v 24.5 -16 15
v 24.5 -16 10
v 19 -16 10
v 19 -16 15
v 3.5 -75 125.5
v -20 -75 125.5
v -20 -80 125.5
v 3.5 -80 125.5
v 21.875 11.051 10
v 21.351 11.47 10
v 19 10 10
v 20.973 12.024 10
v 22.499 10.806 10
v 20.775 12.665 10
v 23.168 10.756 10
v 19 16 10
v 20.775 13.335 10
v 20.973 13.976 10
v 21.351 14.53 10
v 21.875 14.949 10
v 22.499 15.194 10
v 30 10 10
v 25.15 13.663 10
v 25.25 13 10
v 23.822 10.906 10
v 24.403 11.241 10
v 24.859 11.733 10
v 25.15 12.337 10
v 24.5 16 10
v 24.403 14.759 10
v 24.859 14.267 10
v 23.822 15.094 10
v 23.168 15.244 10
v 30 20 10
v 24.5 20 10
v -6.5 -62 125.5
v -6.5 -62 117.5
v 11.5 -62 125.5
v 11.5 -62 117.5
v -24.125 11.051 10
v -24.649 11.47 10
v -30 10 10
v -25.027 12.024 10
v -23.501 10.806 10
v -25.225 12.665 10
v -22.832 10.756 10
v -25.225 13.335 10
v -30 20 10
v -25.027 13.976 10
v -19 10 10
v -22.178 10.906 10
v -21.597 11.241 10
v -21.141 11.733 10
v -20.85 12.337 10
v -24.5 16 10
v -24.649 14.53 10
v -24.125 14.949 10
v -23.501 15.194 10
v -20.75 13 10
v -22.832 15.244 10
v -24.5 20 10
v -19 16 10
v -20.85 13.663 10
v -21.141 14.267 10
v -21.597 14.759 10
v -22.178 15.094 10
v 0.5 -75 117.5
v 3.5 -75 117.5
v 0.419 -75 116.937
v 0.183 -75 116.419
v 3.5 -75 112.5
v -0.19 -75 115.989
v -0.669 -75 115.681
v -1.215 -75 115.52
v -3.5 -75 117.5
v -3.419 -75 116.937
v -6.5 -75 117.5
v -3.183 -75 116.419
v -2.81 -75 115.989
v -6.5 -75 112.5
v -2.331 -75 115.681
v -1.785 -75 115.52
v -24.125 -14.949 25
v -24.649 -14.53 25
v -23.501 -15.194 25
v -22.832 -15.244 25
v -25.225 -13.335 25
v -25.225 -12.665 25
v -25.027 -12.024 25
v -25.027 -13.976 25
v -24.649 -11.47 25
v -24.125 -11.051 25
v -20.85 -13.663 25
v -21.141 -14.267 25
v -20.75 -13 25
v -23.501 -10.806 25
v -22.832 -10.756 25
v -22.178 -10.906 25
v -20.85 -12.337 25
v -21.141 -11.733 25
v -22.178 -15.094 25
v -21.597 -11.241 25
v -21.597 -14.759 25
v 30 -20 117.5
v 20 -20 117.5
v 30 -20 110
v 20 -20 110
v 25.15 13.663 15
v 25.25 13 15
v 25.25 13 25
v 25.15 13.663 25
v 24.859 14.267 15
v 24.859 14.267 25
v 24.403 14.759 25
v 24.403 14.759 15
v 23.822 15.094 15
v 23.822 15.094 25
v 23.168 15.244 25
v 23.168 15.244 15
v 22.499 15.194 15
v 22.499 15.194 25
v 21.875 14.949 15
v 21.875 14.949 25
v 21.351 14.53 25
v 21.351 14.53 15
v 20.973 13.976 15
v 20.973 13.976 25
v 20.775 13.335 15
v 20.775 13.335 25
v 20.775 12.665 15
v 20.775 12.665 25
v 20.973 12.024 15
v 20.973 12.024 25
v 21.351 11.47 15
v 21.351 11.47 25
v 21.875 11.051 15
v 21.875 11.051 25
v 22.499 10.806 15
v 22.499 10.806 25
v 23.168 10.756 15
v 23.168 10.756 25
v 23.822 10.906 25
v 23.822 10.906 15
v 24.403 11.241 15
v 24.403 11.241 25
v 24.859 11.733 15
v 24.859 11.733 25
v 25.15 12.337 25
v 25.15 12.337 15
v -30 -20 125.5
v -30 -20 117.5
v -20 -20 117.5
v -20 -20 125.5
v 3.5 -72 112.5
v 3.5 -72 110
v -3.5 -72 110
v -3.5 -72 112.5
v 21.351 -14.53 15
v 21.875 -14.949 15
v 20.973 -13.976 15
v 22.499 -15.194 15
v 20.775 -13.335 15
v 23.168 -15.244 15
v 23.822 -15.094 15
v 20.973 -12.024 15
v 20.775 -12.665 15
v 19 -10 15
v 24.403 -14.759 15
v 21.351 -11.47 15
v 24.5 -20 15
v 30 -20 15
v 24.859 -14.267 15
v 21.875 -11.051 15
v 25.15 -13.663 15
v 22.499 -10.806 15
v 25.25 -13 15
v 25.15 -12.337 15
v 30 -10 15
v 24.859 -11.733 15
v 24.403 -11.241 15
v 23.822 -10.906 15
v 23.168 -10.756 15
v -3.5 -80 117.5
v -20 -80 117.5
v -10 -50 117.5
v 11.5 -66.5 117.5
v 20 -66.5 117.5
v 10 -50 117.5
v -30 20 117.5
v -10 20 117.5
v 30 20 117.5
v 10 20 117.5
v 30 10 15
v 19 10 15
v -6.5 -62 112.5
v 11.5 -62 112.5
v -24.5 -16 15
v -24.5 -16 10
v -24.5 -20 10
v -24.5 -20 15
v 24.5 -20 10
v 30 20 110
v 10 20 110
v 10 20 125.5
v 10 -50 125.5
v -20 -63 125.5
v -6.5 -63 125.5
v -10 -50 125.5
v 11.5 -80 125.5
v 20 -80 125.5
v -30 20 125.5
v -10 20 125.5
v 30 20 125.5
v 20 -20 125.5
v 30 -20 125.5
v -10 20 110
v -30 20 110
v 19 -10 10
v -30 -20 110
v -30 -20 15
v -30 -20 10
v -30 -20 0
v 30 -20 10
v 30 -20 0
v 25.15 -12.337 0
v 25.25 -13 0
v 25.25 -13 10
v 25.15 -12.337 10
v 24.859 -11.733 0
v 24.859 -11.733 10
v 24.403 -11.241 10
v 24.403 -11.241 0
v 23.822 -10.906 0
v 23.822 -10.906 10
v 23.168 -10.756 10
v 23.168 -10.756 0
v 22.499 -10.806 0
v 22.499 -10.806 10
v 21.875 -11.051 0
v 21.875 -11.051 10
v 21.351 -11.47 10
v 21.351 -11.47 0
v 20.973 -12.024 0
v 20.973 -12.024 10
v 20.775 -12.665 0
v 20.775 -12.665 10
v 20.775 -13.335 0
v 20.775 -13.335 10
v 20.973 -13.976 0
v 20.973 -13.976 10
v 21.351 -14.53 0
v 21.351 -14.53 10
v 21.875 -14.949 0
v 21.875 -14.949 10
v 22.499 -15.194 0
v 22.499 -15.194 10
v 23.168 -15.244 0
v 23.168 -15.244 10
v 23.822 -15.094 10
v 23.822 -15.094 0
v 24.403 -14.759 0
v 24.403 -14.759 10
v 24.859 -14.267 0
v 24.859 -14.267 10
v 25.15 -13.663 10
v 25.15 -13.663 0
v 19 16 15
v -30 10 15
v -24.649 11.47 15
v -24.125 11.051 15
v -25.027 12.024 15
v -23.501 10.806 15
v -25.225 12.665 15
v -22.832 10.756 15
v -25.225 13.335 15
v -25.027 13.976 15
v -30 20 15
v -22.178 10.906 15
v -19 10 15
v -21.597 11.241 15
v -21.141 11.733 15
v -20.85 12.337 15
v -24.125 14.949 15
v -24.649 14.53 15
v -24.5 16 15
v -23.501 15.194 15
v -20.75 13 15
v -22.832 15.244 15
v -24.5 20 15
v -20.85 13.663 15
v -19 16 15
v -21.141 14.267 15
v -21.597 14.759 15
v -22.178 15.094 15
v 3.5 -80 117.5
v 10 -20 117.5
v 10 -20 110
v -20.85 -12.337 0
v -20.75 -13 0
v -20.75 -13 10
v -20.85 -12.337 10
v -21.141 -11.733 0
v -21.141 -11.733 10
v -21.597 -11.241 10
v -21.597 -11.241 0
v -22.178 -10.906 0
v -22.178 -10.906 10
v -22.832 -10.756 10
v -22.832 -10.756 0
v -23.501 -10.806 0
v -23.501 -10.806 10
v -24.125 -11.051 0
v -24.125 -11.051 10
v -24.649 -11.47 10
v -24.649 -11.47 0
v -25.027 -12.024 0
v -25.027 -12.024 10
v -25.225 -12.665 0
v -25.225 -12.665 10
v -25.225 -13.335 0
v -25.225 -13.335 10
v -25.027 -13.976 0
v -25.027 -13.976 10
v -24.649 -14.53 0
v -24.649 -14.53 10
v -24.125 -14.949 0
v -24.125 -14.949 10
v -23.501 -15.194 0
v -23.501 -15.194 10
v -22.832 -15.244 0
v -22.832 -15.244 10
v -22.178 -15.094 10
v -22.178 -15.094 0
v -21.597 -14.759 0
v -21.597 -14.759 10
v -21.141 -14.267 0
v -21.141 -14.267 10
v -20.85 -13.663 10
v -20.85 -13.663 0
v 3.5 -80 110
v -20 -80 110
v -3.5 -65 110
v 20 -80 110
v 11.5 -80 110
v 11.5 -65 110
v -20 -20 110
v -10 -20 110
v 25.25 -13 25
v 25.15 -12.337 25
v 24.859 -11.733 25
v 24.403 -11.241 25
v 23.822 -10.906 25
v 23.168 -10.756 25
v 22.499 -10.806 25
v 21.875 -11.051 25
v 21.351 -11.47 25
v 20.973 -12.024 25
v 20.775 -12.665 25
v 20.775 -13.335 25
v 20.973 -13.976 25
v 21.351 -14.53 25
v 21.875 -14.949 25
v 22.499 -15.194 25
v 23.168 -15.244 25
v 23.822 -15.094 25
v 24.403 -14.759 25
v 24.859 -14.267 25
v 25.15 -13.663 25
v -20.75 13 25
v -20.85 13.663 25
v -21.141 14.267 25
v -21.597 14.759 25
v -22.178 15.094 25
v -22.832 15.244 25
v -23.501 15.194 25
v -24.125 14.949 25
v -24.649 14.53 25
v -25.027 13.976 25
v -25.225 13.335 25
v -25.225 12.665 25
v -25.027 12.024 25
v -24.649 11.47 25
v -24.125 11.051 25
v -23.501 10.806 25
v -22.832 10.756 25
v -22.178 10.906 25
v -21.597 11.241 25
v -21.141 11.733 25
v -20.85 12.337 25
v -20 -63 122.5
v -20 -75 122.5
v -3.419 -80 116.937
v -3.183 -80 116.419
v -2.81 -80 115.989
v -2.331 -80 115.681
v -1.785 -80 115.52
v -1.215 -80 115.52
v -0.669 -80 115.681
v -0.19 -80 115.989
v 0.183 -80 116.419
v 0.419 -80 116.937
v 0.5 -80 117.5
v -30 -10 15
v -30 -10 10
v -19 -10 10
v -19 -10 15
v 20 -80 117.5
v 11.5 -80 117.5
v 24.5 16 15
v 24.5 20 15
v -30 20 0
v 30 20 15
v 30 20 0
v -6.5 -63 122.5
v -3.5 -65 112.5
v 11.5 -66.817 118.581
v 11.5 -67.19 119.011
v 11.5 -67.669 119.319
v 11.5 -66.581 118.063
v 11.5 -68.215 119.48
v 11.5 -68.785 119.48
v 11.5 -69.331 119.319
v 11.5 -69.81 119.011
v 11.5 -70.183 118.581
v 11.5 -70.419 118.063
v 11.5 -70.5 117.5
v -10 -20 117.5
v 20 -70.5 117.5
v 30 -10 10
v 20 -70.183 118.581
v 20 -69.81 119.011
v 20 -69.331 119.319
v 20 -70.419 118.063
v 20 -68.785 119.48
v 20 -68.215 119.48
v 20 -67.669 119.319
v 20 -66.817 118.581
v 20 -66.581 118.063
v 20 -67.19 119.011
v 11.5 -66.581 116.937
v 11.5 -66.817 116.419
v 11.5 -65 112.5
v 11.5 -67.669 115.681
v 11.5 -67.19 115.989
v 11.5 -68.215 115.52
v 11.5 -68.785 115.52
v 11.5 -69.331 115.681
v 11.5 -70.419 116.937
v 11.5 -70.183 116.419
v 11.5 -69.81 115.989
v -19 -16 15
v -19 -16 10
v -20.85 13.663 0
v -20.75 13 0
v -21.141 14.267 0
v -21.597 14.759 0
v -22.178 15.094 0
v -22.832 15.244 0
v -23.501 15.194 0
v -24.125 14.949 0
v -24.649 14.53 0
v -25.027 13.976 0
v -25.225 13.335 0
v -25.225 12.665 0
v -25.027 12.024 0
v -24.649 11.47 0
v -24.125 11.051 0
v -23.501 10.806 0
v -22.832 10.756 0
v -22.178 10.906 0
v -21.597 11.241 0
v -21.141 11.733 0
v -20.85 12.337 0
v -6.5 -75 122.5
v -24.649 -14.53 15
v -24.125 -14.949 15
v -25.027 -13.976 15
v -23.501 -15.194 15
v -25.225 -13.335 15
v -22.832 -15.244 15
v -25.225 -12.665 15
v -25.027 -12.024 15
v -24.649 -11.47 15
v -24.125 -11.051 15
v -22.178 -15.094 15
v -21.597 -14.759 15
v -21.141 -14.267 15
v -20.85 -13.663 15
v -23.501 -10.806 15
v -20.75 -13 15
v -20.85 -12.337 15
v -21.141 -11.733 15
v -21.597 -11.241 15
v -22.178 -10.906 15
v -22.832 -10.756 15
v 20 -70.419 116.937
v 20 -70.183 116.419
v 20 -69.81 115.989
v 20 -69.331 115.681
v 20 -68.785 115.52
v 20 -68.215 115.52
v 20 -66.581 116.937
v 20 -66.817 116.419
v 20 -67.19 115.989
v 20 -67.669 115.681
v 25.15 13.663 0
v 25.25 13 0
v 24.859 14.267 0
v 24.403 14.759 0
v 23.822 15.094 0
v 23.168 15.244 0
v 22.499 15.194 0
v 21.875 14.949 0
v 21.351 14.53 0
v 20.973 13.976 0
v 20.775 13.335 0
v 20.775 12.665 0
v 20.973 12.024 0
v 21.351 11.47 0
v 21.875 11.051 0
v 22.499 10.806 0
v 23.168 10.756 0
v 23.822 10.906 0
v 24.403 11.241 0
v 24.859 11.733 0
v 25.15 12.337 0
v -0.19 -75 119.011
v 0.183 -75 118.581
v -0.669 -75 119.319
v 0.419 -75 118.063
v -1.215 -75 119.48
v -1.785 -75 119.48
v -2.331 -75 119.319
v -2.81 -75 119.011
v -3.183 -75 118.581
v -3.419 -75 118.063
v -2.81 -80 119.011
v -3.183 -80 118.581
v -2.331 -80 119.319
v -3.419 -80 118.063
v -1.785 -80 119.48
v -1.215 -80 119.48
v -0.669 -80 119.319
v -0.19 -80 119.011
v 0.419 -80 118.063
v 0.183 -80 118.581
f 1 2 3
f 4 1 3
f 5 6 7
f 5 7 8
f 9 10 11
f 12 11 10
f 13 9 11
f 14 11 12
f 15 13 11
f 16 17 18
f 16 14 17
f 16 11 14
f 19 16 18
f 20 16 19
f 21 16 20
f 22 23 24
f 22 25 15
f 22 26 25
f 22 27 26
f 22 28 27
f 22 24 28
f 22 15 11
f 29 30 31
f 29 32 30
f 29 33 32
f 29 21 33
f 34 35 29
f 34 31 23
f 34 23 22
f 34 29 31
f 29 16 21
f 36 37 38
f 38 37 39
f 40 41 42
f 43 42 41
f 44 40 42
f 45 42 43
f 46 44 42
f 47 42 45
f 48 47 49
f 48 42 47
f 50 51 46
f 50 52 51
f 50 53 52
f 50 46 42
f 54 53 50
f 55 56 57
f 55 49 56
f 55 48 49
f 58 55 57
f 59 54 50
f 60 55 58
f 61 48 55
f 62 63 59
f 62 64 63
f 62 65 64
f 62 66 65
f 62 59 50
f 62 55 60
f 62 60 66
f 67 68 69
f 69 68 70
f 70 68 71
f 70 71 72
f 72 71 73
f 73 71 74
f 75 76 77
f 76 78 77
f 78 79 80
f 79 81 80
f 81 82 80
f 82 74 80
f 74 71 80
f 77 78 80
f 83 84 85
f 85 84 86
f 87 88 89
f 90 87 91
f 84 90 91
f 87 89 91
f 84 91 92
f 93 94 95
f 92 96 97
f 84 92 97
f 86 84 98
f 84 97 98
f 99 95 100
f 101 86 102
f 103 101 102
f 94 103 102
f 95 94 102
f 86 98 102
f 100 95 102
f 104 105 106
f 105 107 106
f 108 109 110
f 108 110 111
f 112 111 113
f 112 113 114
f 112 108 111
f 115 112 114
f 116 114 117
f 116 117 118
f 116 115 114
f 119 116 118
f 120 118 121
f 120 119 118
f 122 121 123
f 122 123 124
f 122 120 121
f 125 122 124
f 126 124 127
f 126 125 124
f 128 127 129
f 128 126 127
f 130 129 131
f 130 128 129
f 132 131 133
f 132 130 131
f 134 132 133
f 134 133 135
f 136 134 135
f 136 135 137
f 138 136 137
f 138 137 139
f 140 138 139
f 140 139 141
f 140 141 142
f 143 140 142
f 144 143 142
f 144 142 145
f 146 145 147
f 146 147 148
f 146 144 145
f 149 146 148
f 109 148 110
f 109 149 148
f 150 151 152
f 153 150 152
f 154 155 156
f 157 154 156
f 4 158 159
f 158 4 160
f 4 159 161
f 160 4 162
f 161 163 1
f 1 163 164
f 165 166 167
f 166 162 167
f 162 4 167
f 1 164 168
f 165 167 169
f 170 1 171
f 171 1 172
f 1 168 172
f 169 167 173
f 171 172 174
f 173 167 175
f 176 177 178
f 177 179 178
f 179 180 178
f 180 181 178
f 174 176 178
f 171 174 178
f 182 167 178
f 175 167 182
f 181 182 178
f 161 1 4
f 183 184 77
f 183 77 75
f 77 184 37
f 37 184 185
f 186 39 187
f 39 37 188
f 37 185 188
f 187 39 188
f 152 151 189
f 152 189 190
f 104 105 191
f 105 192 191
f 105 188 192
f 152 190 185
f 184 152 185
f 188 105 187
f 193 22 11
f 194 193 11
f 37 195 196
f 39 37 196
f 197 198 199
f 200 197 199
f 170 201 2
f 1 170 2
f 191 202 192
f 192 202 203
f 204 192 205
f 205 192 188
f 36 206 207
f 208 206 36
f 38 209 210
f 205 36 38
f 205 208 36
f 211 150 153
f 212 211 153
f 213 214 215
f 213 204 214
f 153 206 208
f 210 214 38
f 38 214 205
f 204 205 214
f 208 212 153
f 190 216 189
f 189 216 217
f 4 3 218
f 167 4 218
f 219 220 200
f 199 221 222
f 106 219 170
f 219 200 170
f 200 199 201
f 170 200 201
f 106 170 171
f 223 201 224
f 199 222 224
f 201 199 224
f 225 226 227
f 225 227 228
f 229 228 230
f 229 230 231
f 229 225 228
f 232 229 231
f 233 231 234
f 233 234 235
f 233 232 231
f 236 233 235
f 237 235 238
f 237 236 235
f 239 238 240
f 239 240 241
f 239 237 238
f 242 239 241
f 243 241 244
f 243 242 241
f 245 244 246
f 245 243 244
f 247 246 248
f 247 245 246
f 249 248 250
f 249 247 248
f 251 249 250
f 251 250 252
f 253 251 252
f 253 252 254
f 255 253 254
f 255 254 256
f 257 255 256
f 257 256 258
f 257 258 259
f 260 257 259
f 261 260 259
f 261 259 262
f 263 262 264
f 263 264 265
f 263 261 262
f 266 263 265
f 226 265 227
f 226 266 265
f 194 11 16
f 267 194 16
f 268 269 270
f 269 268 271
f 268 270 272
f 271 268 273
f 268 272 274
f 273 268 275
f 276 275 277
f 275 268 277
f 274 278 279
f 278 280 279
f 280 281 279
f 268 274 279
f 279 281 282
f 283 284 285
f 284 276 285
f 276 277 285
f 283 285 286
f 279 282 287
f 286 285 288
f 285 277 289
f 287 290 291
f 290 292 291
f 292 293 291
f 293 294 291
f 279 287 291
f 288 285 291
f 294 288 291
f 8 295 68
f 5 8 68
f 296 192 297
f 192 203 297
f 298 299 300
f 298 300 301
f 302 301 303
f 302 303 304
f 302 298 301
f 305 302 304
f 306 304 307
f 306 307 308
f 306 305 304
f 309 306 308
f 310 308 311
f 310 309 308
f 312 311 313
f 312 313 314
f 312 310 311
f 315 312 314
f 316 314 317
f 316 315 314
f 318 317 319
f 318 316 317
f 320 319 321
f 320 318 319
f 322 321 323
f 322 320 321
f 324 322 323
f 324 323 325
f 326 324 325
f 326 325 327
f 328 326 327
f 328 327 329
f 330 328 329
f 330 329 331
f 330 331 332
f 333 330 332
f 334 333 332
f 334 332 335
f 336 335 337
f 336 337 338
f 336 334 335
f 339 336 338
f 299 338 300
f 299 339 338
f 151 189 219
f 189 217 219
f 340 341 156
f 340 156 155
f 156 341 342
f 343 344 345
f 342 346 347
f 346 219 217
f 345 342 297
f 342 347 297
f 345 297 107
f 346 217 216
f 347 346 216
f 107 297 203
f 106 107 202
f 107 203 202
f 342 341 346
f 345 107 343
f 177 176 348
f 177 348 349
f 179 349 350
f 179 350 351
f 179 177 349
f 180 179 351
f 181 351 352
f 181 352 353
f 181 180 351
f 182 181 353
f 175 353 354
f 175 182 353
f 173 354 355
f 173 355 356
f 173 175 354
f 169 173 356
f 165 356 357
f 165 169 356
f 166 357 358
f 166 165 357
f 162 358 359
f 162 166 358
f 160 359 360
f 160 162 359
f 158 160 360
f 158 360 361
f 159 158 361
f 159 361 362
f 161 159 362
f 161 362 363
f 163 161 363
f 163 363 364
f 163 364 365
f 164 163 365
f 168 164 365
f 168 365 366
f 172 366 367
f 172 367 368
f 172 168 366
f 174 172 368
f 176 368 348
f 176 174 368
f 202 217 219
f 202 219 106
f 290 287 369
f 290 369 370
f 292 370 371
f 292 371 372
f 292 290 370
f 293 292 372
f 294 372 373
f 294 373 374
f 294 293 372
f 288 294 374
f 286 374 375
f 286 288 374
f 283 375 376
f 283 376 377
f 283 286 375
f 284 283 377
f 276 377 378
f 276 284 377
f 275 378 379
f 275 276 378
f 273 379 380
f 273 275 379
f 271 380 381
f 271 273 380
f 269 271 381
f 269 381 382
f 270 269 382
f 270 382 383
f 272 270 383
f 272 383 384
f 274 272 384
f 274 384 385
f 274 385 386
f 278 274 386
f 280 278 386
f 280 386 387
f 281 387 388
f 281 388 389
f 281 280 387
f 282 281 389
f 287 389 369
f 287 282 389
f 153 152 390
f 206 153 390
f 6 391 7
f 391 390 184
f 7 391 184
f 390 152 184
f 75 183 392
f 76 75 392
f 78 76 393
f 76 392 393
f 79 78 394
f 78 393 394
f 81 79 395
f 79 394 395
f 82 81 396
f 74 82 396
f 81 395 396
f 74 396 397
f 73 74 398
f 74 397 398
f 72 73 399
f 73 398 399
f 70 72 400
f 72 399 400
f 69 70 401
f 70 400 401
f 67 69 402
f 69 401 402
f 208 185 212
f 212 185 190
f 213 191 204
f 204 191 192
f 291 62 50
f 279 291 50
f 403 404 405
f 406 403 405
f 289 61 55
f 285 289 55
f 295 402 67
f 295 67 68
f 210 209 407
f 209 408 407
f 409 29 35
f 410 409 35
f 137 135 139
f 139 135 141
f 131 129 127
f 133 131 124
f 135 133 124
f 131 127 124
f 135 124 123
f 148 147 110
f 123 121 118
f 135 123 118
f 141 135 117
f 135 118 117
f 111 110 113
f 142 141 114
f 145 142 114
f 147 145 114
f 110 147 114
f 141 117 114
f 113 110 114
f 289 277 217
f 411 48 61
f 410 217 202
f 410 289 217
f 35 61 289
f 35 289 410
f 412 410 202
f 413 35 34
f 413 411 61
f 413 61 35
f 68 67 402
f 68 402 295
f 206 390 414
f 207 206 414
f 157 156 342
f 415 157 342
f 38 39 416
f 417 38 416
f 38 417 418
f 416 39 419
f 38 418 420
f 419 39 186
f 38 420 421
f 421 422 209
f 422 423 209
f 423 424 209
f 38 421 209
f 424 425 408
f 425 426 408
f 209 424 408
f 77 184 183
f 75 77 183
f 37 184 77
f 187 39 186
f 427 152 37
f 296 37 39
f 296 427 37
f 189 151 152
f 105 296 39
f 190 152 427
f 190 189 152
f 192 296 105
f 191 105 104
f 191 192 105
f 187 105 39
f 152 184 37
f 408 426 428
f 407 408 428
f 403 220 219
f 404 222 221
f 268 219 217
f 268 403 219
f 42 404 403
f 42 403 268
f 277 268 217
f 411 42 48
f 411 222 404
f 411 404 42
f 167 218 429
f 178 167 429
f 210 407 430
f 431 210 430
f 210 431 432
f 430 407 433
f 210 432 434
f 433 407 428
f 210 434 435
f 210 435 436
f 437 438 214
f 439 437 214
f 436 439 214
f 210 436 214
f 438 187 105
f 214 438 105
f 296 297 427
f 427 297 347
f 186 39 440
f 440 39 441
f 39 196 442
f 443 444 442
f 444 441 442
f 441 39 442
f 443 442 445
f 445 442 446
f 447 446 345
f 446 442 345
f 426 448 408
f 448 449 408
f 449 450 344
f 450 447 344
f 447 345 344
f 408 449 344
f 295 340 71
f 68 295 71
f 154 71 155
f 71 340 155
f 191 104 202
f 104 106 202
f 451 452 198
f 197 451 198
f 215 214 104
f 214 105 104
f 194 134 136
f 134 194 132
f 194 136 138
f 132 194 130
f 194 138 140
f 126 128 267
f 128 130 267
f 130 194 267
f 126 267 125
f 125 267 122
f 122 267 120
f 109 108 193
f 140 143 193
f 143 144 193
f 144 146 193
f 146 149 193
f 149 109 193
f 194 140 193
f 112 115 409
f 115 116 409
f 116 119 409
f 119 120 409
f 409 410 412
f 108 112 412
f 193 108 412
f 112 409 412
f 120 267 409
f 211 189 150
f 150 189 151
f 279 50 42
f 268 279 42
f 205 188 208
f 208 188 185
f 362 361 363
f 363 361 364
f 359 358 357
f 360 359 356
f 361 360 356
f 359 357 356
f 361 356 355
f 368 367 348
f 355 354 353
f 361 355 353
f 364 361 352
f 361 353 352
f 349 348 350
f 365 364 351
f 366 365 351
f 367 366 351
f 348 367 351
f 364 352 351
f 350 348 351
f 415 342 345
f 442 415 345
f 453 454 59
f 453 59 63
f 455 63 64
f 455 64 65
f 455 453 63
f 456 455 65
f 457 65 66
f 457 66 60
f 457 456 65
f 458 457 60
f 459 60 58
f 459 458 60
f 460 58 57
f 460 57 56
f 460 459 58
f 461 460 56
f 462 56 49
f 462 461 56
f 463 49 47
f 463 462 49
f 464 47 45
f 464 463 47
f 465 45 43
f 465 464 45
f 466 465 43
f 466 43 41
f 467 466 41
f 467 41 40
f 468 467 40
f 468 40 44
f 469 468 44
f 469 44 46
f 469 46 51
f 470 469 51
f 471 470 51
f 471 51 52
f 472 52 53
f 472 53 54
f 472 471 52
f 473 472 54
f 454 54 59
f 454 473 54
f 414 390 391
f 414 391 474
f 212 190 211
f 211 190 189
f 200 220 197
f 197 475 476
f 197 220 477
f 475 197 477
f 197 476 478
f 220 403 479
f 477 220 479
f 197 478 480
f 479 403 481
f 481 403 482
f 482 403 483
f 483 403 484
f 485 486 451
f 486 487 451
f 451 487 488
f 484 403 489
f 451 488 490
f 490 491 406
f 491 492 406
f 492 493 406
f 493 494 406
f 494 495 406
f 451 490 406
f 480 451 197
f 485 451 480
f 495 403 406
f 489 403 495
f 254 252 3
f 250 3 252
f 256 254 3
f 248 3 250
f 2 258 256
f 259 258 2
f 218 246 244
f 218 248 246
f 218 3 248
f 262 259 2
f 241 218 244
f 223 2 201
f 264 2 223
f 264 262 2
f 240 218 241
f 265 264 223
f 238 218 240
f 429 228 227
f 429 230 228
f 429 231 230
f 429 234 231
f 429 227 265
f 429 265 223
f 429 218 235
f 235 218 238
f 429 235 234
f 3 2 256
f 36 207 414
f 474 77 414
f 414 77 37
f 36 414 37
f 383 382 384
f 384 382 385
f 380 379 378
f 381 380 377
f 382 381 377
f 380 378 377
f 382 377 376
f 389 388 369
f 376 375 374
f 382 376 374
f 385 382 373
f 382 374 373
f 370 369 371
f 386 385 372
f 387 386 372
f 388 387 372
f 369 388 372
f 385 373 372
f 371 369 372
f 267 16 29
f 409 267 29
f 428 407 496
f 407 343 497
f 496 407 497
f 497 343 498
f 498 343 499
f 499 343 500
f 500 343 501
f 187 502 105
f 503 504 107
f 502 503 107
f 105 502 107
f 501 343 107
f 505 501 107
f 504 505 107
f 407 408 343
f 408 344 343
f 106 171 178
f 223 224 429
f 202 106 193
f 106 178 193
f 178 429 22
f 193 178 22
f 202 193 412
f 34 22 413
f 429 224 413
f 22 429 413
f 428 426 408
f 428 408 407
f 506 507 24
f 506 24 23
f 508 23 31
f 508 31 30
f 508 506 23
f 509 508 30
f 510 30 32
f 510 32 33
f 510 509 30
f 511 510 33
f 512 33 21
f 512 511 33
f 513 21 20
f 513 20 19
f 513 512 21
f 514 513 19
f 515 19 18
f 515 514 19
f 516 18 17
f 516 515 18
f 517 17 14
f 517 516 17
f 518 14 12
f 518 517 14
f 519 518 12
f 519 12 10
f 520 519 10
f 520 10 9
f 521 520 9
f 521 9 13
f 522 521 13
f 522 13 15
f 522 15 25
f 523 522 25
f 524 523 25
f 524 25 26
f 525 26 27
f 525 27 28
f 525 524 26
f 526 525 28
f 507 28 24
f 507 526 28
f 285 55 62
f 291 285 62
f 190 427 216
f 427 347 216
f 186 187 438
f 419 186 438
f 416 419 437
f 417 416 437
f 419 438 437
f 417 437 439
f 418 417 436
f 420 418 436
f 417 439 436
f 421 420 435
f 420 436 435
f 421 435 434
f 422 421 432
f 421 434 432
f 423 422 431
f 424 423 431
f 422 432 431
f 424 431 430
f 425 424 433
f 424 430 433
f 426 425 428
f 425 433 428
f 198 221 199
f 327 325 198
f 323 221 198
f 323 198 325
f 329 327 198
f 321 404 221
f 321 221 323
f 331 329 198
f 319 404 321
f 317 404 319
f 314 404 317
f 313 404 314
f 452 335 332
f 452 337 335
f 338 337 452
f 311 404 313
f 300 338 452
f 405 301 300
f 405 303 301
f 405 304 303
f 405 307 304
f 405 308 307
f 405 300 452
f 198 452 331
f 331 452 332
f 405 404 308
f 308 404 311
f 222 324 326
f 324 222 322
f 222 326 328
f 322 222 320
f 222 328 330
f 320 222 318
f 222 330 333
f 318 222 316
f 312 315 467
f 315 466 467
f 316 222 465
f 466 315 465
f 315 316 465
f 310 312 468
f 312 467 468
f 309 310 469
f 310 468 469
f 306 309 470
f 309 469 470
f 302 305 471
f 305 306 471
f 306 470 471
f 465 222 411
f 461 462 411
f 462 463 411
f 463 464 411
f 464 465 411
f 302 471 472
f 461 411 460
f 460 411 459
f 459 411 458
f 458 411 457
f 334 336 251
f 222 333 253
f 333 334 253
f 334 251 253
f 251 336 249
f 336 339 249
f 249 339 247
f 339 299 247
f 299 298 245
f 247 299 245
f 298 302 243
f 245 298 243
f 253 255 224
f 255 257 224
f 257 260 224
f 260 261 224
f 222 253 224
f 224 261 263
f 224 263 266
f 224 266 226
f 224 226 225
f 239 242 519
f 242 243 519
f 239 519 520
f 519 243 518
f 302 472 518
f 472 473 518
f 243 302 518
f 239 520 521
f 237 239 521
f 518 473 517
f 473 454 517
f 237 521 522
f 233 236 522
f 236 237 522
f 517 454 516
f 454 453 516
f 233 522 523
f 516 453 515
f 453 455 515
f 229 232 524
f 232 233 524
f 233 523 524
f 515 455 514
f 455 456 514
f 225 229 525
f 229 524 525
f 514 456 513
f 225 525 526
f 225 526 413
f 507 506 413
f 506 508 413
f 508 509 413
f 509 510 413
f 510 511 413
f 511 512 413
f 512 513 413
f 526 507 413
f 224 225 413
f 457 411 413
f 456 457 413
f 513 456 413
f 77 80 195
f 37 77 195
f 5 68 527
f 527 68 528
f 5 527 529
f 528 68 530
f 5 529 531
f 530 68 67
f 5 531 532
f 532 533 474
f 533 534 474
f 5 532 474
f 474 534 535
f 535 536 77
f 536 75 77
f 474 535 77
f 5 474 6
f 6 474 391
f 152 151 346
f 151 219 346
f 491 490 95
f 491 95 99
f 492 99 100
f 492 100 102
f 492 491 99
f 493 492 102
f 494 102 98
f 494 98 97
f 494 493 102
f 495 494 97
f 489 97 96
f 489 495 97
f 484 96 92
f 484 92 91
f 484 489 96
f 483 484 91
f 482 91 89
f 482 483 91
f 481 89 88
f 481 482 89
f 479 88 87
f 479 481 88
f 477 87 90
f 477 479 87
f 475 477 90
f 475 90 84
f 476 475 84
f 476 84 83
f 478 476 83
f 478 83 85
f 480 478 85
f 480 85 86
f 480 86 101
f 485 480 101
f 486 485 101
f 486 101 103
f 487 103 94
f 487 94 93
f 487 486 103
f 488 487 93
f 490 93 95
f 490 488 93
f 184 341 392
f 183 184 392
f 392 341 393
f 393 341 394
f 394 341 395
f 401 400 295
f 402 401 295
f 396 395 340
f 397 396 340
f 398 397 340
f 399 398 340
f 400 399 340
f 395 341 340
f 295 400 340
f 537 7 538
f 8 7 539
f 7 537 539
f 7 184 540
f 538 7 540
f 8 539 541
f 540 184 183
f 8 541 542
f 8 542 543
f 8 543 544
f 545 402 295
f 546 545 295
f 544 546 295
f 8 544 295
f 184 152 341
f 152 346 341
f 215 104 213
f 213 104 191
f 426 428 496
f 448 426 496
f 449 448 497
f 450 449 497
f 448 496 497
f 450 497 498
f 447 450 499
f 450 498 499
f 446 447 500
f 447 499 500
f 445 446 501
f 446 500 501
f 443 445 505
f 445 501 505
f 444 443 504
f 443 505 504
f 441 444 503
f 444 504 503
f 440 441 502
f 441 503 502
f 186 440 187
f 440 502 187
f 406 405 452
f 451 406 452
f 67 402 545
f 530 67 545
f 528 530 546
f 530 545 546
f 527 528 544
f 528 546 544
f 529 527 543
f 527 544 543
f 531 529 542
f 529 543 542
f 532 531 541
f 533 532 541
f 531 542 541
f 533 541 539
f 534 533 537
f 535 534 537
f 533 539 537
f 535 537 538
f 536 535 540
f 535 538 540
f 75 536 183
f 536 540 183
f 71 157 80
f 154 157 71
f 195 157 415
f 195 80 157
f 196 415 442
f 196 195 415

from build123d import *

# Parameters (mm, degrees)
F0_W      = 60
F0_H      = 40
F0_R      = 2.25
F1_DEPTH  = 10
F3_DEPTH  = 5
F4_W      = 60
F4_H      = 40
F4_R      = 2.25
F5_DEPTH  = 10
F6_W      = 60
F6_H      = 40
F7_DEPTH  = 85
F9_DEPTH  = 2.5
F11_DEPTH = 5
F13_DEPTH = 5
F15_DEPTH = 3
F16_R     = 2
F17_DEPTH = 10
F18_R     = 2
F19_DEPTH = 10


with BuildPart() as f1:
    # F0 (on Top) → F1 (new body)
    with BuildSketch(Plane.XY):
        Rectangle(F0_W, F0_H)
        with Locations((-23, -13)):
            Circle(F0_R, mode=Mode.SUBTRACT)
        with Locations((23, -13)):
            Circle(F0_R, mode=Mode.SUBTRACT)
        with Locations((-23, 13)):
            Circle(F0_R, mode=Mode.SUBTRACT)
        with Locations((23, 13)):
            Circle(F0_R, mode=Mode.SUBTRACT)
    extrude(amount=F1_DEPTH)

    # F2 (on face) → F3 (join)
    with BuildSketch(Plane.XY.offset(10)):
        Polygon((-24.5, 16), (-19, 16), (-19, 10), (-30, 10), (-30, -10), (-19, -10), (-19, -16), (-24.5, -16), (-24.5, -20), (24.5, -20), (24.5, -16), (19, -16), (19, -10), (30, -10), (30, 10), (19, 10), (19, 16), (24.5, 16), (24.5, 20), (-24.5, 20), align=None)
    extrude(amount=F3_DEPTH)

    # F4 (on face) → F5 (join)
    with BuildSketch(Plane.XY.offset(15)):
        Rectangle(F4_W, F4_H)
        with Locations((-23, -13)):
            Circle(F4_R, mode=Mode.SUBTRACT)
        with Locations((23, -13)):
            Circle(F4_R, mode=Mode.SUBTRACT)
        with Locations((-23, 13)):
            Circle(F4_R, mode=Mode.SUBTRACT)
        with Locations((23, 13)):
            Circle(F4_R, mode=Mode.SUBTRACT)
    extrude(amount=F5_DEPTH)

    # F6 (on face) → F7 (join)
    with BuildSketch(Plane.XY.offset(25)):
        Rectangle(F6_W, F6_H)
    extrude(amount=F7_DEPTH)


with BuildPart() as f9:
    # F8 (on face) → F9 (new body)
    with BuildSketch(Plane.XY.offset(110)):
        Polygon((-10, 20), (-30, 20), (-30, -20), (-20, -20), (-10, -20), align=None)
        Polygon((30, 20), (10, 20), (10, -20), (20, -20), (30, -20), align=None)
        Polygon((10, -20), (-10, -20), (-20, -20), (-20, -80), (3.5, -80), (3.5, -72), (-3.5, -72), (-3.5, -65), (3.5, -65), (11.5, -65), (11.5, -80), (20, -80), (20, -20), align=None)
    extrude(amount=F9_DEPTH)

    # F10 (on face) → F11 (join)
    with BuildSketch(Plane.XY.offset(112.5)):
        Polygon((-6.5, -62), (3.5, -62), (11.5, -62), (11.5, -65), (11.5, -80), (20, -80), (20, -20), (30, -20), (30, 20), (10, 20), (10, -20), (-10, -20), (-10, 20), (-30, 20), (-30, -20), (-20, -20), (-20, -80), (3.5, -80), (3.5, -75), (-6.5, -75), align=None)
    extrude(amount=F11_DEPTH)


with BuildPart() as f13:
    # F12 (on face) → F13 (new body)
    with BuildSketch(Plane.XY.offset(117.5)):
        Polygon((10, -50), (-10, -50), (-10, -20), (-10, 20), (-30, 20), (-30, -20), (-20, -20), (-20, -80), (3.5, -80), (3.5, -75), (-6.5, -75), (-6.5, -62), (11.5, -62), (11.5, -80), (20, -80), (20, -20), (30, -20), (30, 20), (10, 20), (10, -20), align=None)
    extrude(amount=F13_DEPTH)

    # F14 (on face) → F15 (join)
    with BuildSketch(Plane.XY.offset(122.5)):
        Polygon((-20, -20), (-20, -63), (-6.5, -63), (-6.5, -62), (11.5, -62), (11.5, -80), (20, -80), (20, -20), (30, -20), (30, 20), (10, 20), (10, -50), (-10, -50), (-10, 20), (-30, 20), (-30, -20), align=None)
        Polygon((-6.5, -75), (-20, -75), (-20, -80), (3.5, -80), (3.5, -75), align=None)
    extrude(amount=F15_DEPTH)


with BuildPart() as f17_tool:
    # F16 (on face) → F17 (new body)
    with BuildSketch(Plane.YZ.offset(20)):
        with Locations((-68.5, 117.5)):
            Circle(F16_R)
    extrude(amount=-F17_DEPTH)


with BuildPart() as f9_1:
    add(f9.part)

    # F17: cut by f17_tool
    add(f17_tool.part, mode=Mode.SUBTRACT)


with BuildPart() as f13_1:
    add(f13.part)

    # F17: cut by f17_tool
    add(f17_tool.part, mode=Mode.SUBTRACT)


with BuildPart() as f19_tool:
    # F18 (on face) → F19 (new body)
    with BuildSketch(Plane.XZ.offset(80)):
        with Locations((-1.5, 117.5)):
            Circle(F18_R)
    extrude(amount=-F19_DEPTH)


with BuildPart() as f9_2:
    add(f9_1.part)

    # F19: cut by f19_tool
    add(f19_tool.part, mode=Mode.SUBTRACT)


with BuildPart() as f13_2:
    add(f13_1.part)

    # F19: cut by f19_tool
    add(f19_tool.part, mode=Mode.SUBTRACT)


solid = Compound([f1.part, f9_2.part, f13_2.part])
